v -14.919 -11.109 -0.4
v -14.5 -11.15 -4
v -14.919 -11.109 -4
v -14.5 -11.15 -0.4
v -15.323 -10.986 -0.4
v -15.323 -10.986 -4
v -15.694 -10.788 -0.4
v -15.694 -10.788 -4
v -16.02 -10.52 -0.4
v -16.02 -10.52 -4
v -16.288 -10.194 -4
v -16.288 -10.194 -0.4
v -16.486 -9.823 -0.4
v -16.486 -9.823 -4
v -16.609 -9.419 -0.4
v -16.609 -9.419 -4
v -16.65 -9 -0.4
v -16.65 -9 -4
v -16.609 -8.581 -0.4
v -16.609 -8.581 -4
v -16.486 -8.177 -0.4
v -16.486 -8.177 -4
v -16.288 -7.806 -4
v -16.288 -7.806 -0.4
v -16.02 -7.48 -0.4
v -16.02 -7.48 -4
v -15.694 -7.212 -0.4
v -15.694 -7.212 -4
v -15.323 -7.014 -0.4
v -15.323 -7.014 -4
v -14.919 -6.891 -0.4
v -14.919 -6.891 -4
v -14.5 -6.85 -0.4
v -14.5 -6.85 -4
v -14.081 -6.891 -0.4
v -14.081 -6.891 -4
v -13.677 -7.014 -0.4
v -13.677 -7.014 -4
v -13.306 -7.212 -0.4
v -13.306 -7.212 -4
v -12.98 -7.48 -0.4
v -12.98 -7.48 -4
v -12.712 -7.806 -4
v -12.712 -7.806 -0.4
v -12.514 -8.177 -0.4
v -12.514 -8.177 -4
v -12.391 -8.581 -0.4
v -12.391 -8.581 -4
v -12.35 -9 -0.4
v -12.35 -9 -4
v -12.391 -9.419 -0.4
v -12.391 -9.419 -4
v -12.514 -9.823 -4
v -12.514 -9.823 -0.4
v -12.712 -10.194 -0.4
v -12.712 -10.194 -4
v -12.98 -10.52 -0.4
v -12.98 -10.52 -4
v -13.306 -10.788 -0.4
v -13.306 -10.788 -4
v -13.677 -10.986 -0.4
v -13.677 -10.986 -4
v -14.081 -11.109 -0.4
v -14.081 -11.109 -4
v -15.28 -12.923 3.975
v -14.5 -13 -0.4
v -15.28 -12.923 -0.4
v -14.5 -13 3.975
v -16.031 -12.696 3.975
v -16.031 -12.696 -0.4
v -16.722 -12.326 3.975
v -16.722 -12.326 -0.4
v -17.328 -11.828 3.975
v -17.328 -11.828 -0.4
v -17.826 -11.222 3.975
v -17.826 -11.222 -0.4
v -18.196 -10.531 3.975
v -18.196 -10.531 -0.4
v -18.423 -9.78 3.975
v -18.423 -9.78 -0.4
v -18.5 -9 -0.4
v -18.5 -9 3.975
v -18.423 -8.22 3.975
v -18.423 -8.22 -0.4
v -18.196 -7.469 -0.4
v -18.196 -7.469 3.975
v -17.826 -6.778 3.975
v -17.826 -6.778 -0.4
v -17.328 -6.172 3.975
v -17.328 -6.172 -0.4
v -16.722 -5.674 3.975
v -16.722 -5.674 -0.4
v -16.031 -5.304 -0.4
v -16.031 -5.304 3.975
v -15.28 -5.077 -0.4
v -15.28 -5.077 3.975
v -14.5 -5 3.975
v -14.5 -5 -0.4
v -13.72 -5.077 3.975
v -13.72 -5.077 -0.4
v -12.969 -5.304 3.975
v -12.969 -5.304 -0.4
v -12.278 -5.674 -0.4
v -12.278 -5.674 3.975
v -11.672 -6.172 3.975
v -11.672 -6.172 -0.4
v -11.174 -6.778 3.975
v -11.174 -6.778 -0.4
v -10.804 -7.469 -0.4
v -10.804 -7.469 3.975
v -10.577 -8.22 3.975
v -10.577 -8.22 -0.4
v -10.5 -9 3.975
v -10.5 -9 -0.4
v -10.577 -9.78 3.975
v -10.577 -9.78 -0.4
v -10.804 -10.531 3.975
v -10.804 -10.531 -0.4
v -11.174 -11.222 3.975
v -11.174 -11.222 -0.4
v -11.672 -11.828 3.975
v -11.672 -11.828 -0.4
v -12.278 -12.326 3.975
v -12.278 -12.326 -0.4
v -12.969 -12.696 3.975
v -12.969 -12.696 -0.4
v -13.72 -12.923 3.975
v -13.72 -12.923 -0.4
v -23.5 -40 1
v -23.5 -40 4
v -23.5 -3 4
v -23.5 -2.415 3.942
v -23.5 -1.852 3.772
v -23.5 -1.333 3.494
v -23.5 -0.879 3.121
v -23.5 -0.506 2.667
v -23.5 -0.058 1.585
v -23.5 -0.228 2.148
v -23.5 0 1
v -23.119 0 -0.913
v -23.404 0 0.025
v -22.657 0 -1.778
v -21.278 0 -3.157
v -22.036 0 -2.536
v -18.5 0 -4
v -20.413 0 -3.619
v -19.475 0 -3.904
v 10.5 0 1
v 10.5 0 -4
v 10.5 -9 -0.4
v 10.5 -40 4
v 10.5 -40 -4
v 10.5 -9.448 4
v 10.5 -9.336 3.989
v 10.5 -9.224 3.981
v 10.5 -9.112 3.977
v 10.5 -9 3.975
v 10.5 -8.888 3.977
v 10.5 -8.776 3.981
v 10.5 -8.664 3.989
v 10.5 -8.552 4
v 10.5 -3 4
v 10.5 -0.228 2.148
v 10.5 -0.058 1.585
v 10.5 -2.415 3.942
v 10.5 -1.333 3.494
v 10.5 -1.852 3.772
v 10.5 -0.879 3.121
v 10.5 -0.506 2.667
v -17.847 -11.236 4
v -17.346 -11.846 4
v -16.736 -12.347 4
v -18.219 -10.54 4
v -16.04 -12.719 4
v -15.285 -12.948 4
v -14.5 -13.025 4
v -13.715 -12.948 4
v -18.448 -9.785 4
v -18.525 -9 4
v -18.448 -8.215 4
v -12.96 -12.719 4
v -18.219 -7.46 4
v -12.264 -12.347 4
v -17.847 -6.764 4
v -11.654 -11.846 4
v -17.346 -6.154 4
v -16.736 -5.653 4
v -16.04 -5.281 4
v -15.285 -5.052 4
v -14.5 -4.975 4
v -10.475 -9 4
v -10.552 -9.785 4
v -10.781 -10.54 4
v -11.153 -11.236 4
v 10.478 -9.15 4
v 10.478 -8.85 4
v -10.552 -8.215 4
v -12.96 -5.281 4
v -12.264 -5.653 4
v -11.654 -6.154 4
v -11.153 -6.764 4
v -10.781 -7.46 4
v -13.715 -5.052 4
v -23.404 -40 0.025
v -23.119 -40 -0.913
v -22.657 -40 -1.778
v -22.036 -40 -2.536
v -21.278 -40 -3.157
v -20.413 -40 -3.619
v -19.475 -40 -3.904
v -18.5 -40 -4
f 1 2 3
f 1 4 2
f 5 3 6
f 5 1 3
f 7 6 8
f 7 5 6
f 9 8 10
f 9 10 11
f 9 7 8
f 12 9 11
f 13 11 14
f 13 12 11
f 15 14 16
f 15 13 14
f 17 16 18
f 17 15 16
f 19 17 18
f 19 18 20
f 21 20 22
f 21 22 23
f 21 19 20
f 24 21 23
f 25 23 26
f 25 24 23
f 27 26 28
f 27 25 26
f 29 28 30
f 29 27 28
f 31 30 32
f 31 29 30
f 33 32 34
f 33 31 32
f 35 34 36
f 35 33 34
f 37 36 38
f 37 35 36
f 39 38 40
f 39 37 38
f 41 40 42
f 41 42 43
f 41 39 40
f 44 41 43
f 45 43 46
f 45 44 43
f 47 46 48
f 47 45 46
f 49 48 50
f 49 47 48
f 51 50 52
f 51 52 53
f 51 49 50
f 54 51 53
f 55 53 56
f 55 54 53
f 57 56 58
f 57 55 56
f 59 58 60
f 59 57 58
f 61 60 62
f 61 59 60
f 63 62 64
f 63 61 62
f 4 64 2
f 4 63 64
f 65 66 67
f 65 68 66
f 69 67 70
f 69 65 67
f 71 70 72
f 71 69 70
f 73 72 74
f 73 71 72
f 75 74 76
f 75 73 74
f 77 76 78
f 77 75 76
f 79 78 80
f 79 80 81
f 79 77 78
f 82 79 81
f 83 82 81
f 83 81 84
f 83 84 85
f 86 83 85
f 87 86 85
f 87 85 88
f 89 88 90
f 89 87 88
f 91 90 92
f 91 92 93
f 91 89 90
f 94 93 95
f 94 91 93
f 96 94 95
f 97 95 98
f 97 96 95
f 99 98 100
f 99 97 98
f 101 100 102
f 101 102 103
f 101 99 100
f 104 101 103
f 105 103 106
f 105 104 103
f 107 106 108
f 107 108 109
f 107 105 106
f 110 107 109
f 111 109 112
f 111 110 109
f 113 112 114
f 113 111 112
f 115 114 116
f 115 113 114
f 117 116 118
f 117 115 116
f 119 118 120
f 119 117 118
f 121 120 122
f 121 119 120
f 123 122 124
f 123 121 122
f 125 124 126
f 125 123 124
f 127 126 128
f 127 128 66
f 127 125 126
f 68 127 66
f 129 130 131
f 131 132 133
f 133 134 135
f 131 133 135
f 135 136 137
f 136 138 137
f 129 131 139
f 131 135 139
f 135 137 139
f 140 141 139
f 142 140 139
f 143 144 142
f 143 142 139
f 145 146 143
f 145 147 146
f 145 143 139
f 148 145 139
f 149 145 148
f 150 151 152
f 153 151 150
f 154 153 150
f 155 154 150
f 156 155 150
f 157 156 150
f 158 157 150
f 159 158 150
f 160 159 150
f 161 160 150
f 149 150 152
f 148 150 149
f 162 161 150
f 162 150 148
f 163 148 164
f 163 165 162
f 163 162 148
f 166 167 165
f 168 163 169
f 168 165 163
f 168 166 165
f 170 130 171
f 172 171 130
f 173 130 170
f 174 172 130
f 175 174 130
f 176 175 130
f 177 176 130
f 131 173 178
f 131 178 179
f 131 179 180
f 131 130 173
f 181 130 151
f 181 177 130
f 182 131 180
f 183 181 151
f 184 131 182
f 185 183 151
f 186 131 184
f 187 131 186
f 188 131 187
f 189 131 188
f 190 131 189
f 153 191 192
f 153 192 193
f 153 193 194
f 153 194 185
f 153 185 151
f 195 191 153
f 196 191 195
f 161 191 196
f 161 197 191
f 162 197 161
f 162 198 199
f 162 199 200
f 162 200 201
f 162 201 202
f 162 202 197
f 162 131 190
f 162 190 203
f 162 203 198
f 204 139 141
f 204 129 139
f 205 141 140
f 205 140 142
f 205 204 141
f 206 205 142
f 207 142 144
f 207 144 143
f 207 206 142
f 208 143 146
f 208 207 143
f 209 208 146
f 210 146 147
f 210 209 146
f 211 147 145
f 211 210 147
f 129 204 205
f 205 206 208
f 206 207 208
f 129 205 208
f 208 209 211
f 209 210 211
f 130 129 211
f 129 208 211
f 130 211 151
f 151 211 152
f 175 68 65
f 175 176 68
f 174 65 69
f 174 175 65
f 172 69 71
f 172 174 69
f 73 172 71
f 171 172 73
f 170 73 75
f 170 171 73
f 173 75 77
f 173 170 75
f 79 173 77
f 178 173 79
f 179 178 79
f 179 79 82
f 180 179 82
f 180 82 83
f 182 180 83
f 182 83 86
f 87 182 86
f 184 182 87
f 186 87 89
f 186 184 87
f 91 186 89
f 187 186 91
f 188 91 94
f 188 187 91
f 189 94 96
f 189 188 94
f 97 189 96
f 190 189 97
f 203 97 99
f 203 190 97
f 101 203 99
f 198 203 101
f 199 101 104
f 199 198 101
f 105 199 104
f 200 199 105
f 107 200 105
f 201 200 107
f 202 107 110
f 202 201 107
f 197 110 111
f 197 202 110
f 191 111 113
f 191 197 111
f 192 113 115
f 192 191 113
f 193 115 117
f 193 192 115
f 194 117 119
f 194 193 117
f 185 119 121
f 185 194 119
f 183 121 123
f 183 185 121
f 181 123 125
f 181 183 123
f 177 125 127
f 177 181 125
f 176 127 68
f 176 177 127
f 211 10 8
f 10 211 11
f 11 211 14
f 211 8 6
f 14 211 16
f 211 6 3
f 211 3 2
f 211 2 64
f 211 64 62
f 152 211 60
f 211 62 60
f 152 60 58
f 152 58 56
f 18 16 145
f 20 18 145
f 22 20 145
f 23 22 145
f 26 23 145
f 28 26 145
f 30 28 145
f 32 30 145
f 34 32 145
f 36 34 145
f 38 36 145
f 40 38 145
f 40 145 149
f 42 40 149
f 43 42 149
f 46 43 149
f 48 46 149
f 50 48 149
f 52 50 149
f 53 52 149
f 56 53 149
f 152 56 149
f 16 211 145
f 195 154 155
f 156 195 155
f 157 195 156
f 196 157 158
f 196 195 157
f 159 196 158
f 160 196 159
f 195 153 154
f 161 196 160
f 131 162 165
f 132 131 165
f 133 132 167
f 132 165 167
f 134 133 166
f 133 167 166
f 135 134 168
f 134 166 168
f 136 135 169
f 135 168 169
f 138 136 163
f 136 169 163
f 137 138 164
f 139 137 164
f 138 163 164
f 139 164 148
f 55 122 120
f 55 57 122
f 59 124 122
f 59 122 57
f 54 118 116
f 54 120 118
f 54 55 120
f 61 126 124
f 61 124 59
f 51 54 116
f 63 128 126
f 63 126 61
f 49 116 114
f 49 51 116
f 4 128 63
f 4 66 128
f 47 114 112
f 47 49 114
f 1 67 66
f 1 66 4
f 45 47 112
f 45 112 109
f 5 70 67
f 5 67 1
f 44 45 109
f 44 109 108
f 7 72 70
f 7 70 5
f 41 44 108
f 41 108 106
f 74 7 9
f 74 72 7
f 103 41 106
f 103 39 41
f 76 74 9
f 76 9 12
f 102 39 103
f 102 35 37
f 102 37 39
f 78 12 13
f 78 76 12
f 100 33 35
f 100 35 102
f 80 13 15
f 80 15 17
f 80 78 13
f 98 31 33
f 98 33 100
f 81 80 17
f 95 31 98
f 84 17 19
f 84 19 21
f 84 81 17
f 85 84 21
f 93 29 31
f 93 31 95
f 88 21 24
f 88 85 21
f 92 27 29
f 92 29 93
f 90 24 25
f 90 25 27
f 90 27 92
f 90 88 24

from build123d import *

# Parameters (mm, degrees)
SKETCH1_W                                    = 47
SKETCH1_H                                    = 8
BOSS_EXTRUDE1_DEPTH                          = 40
FILLET1_R                                    = 3
FILLET2_R                                    = 5
CBORE_FOR_M4_HEX_SOCKET_HEAD_CAP_SCR_2_COUNT = 2
CBORE_FOR_M4_HEX_SOCKET_HEAD_CAP_SCR_2_PITCH = 29
CUT_EXTRUDE1_REACH                           = 49.077
SKETCH5_W                                    = 13
SKETCH5_H                                    = 44.997787144


with BuildPart() as part:
    # Sketch1 → Boss-Extrude1 (new body)
    with BuildSketch(Plane(origin=(0, 0, 0), x_dir=(1, 0, 0), z_dir=(0, 1, 0))):
        Rectangle(SKETCH1_W, SKETCH1_H)
    extrude(amount=-BOSS_EXTRUDE1_DEPTH)

    # Fillet1
    fillet1_edges = [part.edges().sort_by_distance(p)[0] for p in [
        (0, 0, 4),
    ]]
    fillet(fillet1_edges, radius=FILLET1_R)

    # Fillet2
    fillet2_edges = [part.edges().sort_by_distance(p)[0] for p in [
        (-23.5, -20, -4),
        (23.5, -20, -4),
    ]]
    fillet(fillet2_edges, radius=FILLET2_R)

    # Sketch3 → CBORE for M4 Hex Socket Head Cap Screw1 (revolve, cut)
    with BuildSketch(Plane(origin=(-14.5, -9, 4), x_dir=(0, -1, 0), z_dir=(1, 0, 0))):
        Polygon((0, 0), (0, 8), (2.15, 8), (2.15, 4.4), (4, 4.4), (4, 0.025), (4.025, 0), align=None)
    cbore_for_m4_hex_socket_head_cap_screw1 = revolve(axis=Axis((-14.5, -9, 10.35), (0, 0, -1)), mode=Mode.SUBTRACT)

    # CBORE for M4 Hex Socket Head Cap Scr 2: CBORE for M4 Hex Socket Head Cap Screw1 ×2
    with Locations(*[(i * CBORE_FOR_M4_HEX_SOCKET_HEAD_CAP_SCR_2_PITCH, 0, 0) for i in range(1, CBORE_FOR_M4_HEX_SOCKET_HEAD_CAP_SCR_2_COUNT)]):
        add(cbore_for_m4_hex_socket_head_cap_screw1, mode=Mode.SUBTRACT)

    # Sketch5 → Cut-Extrude1 (cut, up to next)
    with BuildSketch(Plane.XY.offset(4), mode=Mode.PRIVATE) as cut_extrude1_sk1:
        with Locations((17, -17.501106428)):
            Rectangle(SKETCH5_W, SKETCH5_H)
    cut_extrude1_tool1 = extrude(cut_extrude1_sk1.sketch, amount=-CUT_EXTRUDE1_REACH, mode=Mode.PRIVATE) & part.part
    add(cut_extrude1_tool1.solids().sort_by_distance((17, -17.501106, 4))[0], mode=Mode.SUBTRACT)


solid = part.part
